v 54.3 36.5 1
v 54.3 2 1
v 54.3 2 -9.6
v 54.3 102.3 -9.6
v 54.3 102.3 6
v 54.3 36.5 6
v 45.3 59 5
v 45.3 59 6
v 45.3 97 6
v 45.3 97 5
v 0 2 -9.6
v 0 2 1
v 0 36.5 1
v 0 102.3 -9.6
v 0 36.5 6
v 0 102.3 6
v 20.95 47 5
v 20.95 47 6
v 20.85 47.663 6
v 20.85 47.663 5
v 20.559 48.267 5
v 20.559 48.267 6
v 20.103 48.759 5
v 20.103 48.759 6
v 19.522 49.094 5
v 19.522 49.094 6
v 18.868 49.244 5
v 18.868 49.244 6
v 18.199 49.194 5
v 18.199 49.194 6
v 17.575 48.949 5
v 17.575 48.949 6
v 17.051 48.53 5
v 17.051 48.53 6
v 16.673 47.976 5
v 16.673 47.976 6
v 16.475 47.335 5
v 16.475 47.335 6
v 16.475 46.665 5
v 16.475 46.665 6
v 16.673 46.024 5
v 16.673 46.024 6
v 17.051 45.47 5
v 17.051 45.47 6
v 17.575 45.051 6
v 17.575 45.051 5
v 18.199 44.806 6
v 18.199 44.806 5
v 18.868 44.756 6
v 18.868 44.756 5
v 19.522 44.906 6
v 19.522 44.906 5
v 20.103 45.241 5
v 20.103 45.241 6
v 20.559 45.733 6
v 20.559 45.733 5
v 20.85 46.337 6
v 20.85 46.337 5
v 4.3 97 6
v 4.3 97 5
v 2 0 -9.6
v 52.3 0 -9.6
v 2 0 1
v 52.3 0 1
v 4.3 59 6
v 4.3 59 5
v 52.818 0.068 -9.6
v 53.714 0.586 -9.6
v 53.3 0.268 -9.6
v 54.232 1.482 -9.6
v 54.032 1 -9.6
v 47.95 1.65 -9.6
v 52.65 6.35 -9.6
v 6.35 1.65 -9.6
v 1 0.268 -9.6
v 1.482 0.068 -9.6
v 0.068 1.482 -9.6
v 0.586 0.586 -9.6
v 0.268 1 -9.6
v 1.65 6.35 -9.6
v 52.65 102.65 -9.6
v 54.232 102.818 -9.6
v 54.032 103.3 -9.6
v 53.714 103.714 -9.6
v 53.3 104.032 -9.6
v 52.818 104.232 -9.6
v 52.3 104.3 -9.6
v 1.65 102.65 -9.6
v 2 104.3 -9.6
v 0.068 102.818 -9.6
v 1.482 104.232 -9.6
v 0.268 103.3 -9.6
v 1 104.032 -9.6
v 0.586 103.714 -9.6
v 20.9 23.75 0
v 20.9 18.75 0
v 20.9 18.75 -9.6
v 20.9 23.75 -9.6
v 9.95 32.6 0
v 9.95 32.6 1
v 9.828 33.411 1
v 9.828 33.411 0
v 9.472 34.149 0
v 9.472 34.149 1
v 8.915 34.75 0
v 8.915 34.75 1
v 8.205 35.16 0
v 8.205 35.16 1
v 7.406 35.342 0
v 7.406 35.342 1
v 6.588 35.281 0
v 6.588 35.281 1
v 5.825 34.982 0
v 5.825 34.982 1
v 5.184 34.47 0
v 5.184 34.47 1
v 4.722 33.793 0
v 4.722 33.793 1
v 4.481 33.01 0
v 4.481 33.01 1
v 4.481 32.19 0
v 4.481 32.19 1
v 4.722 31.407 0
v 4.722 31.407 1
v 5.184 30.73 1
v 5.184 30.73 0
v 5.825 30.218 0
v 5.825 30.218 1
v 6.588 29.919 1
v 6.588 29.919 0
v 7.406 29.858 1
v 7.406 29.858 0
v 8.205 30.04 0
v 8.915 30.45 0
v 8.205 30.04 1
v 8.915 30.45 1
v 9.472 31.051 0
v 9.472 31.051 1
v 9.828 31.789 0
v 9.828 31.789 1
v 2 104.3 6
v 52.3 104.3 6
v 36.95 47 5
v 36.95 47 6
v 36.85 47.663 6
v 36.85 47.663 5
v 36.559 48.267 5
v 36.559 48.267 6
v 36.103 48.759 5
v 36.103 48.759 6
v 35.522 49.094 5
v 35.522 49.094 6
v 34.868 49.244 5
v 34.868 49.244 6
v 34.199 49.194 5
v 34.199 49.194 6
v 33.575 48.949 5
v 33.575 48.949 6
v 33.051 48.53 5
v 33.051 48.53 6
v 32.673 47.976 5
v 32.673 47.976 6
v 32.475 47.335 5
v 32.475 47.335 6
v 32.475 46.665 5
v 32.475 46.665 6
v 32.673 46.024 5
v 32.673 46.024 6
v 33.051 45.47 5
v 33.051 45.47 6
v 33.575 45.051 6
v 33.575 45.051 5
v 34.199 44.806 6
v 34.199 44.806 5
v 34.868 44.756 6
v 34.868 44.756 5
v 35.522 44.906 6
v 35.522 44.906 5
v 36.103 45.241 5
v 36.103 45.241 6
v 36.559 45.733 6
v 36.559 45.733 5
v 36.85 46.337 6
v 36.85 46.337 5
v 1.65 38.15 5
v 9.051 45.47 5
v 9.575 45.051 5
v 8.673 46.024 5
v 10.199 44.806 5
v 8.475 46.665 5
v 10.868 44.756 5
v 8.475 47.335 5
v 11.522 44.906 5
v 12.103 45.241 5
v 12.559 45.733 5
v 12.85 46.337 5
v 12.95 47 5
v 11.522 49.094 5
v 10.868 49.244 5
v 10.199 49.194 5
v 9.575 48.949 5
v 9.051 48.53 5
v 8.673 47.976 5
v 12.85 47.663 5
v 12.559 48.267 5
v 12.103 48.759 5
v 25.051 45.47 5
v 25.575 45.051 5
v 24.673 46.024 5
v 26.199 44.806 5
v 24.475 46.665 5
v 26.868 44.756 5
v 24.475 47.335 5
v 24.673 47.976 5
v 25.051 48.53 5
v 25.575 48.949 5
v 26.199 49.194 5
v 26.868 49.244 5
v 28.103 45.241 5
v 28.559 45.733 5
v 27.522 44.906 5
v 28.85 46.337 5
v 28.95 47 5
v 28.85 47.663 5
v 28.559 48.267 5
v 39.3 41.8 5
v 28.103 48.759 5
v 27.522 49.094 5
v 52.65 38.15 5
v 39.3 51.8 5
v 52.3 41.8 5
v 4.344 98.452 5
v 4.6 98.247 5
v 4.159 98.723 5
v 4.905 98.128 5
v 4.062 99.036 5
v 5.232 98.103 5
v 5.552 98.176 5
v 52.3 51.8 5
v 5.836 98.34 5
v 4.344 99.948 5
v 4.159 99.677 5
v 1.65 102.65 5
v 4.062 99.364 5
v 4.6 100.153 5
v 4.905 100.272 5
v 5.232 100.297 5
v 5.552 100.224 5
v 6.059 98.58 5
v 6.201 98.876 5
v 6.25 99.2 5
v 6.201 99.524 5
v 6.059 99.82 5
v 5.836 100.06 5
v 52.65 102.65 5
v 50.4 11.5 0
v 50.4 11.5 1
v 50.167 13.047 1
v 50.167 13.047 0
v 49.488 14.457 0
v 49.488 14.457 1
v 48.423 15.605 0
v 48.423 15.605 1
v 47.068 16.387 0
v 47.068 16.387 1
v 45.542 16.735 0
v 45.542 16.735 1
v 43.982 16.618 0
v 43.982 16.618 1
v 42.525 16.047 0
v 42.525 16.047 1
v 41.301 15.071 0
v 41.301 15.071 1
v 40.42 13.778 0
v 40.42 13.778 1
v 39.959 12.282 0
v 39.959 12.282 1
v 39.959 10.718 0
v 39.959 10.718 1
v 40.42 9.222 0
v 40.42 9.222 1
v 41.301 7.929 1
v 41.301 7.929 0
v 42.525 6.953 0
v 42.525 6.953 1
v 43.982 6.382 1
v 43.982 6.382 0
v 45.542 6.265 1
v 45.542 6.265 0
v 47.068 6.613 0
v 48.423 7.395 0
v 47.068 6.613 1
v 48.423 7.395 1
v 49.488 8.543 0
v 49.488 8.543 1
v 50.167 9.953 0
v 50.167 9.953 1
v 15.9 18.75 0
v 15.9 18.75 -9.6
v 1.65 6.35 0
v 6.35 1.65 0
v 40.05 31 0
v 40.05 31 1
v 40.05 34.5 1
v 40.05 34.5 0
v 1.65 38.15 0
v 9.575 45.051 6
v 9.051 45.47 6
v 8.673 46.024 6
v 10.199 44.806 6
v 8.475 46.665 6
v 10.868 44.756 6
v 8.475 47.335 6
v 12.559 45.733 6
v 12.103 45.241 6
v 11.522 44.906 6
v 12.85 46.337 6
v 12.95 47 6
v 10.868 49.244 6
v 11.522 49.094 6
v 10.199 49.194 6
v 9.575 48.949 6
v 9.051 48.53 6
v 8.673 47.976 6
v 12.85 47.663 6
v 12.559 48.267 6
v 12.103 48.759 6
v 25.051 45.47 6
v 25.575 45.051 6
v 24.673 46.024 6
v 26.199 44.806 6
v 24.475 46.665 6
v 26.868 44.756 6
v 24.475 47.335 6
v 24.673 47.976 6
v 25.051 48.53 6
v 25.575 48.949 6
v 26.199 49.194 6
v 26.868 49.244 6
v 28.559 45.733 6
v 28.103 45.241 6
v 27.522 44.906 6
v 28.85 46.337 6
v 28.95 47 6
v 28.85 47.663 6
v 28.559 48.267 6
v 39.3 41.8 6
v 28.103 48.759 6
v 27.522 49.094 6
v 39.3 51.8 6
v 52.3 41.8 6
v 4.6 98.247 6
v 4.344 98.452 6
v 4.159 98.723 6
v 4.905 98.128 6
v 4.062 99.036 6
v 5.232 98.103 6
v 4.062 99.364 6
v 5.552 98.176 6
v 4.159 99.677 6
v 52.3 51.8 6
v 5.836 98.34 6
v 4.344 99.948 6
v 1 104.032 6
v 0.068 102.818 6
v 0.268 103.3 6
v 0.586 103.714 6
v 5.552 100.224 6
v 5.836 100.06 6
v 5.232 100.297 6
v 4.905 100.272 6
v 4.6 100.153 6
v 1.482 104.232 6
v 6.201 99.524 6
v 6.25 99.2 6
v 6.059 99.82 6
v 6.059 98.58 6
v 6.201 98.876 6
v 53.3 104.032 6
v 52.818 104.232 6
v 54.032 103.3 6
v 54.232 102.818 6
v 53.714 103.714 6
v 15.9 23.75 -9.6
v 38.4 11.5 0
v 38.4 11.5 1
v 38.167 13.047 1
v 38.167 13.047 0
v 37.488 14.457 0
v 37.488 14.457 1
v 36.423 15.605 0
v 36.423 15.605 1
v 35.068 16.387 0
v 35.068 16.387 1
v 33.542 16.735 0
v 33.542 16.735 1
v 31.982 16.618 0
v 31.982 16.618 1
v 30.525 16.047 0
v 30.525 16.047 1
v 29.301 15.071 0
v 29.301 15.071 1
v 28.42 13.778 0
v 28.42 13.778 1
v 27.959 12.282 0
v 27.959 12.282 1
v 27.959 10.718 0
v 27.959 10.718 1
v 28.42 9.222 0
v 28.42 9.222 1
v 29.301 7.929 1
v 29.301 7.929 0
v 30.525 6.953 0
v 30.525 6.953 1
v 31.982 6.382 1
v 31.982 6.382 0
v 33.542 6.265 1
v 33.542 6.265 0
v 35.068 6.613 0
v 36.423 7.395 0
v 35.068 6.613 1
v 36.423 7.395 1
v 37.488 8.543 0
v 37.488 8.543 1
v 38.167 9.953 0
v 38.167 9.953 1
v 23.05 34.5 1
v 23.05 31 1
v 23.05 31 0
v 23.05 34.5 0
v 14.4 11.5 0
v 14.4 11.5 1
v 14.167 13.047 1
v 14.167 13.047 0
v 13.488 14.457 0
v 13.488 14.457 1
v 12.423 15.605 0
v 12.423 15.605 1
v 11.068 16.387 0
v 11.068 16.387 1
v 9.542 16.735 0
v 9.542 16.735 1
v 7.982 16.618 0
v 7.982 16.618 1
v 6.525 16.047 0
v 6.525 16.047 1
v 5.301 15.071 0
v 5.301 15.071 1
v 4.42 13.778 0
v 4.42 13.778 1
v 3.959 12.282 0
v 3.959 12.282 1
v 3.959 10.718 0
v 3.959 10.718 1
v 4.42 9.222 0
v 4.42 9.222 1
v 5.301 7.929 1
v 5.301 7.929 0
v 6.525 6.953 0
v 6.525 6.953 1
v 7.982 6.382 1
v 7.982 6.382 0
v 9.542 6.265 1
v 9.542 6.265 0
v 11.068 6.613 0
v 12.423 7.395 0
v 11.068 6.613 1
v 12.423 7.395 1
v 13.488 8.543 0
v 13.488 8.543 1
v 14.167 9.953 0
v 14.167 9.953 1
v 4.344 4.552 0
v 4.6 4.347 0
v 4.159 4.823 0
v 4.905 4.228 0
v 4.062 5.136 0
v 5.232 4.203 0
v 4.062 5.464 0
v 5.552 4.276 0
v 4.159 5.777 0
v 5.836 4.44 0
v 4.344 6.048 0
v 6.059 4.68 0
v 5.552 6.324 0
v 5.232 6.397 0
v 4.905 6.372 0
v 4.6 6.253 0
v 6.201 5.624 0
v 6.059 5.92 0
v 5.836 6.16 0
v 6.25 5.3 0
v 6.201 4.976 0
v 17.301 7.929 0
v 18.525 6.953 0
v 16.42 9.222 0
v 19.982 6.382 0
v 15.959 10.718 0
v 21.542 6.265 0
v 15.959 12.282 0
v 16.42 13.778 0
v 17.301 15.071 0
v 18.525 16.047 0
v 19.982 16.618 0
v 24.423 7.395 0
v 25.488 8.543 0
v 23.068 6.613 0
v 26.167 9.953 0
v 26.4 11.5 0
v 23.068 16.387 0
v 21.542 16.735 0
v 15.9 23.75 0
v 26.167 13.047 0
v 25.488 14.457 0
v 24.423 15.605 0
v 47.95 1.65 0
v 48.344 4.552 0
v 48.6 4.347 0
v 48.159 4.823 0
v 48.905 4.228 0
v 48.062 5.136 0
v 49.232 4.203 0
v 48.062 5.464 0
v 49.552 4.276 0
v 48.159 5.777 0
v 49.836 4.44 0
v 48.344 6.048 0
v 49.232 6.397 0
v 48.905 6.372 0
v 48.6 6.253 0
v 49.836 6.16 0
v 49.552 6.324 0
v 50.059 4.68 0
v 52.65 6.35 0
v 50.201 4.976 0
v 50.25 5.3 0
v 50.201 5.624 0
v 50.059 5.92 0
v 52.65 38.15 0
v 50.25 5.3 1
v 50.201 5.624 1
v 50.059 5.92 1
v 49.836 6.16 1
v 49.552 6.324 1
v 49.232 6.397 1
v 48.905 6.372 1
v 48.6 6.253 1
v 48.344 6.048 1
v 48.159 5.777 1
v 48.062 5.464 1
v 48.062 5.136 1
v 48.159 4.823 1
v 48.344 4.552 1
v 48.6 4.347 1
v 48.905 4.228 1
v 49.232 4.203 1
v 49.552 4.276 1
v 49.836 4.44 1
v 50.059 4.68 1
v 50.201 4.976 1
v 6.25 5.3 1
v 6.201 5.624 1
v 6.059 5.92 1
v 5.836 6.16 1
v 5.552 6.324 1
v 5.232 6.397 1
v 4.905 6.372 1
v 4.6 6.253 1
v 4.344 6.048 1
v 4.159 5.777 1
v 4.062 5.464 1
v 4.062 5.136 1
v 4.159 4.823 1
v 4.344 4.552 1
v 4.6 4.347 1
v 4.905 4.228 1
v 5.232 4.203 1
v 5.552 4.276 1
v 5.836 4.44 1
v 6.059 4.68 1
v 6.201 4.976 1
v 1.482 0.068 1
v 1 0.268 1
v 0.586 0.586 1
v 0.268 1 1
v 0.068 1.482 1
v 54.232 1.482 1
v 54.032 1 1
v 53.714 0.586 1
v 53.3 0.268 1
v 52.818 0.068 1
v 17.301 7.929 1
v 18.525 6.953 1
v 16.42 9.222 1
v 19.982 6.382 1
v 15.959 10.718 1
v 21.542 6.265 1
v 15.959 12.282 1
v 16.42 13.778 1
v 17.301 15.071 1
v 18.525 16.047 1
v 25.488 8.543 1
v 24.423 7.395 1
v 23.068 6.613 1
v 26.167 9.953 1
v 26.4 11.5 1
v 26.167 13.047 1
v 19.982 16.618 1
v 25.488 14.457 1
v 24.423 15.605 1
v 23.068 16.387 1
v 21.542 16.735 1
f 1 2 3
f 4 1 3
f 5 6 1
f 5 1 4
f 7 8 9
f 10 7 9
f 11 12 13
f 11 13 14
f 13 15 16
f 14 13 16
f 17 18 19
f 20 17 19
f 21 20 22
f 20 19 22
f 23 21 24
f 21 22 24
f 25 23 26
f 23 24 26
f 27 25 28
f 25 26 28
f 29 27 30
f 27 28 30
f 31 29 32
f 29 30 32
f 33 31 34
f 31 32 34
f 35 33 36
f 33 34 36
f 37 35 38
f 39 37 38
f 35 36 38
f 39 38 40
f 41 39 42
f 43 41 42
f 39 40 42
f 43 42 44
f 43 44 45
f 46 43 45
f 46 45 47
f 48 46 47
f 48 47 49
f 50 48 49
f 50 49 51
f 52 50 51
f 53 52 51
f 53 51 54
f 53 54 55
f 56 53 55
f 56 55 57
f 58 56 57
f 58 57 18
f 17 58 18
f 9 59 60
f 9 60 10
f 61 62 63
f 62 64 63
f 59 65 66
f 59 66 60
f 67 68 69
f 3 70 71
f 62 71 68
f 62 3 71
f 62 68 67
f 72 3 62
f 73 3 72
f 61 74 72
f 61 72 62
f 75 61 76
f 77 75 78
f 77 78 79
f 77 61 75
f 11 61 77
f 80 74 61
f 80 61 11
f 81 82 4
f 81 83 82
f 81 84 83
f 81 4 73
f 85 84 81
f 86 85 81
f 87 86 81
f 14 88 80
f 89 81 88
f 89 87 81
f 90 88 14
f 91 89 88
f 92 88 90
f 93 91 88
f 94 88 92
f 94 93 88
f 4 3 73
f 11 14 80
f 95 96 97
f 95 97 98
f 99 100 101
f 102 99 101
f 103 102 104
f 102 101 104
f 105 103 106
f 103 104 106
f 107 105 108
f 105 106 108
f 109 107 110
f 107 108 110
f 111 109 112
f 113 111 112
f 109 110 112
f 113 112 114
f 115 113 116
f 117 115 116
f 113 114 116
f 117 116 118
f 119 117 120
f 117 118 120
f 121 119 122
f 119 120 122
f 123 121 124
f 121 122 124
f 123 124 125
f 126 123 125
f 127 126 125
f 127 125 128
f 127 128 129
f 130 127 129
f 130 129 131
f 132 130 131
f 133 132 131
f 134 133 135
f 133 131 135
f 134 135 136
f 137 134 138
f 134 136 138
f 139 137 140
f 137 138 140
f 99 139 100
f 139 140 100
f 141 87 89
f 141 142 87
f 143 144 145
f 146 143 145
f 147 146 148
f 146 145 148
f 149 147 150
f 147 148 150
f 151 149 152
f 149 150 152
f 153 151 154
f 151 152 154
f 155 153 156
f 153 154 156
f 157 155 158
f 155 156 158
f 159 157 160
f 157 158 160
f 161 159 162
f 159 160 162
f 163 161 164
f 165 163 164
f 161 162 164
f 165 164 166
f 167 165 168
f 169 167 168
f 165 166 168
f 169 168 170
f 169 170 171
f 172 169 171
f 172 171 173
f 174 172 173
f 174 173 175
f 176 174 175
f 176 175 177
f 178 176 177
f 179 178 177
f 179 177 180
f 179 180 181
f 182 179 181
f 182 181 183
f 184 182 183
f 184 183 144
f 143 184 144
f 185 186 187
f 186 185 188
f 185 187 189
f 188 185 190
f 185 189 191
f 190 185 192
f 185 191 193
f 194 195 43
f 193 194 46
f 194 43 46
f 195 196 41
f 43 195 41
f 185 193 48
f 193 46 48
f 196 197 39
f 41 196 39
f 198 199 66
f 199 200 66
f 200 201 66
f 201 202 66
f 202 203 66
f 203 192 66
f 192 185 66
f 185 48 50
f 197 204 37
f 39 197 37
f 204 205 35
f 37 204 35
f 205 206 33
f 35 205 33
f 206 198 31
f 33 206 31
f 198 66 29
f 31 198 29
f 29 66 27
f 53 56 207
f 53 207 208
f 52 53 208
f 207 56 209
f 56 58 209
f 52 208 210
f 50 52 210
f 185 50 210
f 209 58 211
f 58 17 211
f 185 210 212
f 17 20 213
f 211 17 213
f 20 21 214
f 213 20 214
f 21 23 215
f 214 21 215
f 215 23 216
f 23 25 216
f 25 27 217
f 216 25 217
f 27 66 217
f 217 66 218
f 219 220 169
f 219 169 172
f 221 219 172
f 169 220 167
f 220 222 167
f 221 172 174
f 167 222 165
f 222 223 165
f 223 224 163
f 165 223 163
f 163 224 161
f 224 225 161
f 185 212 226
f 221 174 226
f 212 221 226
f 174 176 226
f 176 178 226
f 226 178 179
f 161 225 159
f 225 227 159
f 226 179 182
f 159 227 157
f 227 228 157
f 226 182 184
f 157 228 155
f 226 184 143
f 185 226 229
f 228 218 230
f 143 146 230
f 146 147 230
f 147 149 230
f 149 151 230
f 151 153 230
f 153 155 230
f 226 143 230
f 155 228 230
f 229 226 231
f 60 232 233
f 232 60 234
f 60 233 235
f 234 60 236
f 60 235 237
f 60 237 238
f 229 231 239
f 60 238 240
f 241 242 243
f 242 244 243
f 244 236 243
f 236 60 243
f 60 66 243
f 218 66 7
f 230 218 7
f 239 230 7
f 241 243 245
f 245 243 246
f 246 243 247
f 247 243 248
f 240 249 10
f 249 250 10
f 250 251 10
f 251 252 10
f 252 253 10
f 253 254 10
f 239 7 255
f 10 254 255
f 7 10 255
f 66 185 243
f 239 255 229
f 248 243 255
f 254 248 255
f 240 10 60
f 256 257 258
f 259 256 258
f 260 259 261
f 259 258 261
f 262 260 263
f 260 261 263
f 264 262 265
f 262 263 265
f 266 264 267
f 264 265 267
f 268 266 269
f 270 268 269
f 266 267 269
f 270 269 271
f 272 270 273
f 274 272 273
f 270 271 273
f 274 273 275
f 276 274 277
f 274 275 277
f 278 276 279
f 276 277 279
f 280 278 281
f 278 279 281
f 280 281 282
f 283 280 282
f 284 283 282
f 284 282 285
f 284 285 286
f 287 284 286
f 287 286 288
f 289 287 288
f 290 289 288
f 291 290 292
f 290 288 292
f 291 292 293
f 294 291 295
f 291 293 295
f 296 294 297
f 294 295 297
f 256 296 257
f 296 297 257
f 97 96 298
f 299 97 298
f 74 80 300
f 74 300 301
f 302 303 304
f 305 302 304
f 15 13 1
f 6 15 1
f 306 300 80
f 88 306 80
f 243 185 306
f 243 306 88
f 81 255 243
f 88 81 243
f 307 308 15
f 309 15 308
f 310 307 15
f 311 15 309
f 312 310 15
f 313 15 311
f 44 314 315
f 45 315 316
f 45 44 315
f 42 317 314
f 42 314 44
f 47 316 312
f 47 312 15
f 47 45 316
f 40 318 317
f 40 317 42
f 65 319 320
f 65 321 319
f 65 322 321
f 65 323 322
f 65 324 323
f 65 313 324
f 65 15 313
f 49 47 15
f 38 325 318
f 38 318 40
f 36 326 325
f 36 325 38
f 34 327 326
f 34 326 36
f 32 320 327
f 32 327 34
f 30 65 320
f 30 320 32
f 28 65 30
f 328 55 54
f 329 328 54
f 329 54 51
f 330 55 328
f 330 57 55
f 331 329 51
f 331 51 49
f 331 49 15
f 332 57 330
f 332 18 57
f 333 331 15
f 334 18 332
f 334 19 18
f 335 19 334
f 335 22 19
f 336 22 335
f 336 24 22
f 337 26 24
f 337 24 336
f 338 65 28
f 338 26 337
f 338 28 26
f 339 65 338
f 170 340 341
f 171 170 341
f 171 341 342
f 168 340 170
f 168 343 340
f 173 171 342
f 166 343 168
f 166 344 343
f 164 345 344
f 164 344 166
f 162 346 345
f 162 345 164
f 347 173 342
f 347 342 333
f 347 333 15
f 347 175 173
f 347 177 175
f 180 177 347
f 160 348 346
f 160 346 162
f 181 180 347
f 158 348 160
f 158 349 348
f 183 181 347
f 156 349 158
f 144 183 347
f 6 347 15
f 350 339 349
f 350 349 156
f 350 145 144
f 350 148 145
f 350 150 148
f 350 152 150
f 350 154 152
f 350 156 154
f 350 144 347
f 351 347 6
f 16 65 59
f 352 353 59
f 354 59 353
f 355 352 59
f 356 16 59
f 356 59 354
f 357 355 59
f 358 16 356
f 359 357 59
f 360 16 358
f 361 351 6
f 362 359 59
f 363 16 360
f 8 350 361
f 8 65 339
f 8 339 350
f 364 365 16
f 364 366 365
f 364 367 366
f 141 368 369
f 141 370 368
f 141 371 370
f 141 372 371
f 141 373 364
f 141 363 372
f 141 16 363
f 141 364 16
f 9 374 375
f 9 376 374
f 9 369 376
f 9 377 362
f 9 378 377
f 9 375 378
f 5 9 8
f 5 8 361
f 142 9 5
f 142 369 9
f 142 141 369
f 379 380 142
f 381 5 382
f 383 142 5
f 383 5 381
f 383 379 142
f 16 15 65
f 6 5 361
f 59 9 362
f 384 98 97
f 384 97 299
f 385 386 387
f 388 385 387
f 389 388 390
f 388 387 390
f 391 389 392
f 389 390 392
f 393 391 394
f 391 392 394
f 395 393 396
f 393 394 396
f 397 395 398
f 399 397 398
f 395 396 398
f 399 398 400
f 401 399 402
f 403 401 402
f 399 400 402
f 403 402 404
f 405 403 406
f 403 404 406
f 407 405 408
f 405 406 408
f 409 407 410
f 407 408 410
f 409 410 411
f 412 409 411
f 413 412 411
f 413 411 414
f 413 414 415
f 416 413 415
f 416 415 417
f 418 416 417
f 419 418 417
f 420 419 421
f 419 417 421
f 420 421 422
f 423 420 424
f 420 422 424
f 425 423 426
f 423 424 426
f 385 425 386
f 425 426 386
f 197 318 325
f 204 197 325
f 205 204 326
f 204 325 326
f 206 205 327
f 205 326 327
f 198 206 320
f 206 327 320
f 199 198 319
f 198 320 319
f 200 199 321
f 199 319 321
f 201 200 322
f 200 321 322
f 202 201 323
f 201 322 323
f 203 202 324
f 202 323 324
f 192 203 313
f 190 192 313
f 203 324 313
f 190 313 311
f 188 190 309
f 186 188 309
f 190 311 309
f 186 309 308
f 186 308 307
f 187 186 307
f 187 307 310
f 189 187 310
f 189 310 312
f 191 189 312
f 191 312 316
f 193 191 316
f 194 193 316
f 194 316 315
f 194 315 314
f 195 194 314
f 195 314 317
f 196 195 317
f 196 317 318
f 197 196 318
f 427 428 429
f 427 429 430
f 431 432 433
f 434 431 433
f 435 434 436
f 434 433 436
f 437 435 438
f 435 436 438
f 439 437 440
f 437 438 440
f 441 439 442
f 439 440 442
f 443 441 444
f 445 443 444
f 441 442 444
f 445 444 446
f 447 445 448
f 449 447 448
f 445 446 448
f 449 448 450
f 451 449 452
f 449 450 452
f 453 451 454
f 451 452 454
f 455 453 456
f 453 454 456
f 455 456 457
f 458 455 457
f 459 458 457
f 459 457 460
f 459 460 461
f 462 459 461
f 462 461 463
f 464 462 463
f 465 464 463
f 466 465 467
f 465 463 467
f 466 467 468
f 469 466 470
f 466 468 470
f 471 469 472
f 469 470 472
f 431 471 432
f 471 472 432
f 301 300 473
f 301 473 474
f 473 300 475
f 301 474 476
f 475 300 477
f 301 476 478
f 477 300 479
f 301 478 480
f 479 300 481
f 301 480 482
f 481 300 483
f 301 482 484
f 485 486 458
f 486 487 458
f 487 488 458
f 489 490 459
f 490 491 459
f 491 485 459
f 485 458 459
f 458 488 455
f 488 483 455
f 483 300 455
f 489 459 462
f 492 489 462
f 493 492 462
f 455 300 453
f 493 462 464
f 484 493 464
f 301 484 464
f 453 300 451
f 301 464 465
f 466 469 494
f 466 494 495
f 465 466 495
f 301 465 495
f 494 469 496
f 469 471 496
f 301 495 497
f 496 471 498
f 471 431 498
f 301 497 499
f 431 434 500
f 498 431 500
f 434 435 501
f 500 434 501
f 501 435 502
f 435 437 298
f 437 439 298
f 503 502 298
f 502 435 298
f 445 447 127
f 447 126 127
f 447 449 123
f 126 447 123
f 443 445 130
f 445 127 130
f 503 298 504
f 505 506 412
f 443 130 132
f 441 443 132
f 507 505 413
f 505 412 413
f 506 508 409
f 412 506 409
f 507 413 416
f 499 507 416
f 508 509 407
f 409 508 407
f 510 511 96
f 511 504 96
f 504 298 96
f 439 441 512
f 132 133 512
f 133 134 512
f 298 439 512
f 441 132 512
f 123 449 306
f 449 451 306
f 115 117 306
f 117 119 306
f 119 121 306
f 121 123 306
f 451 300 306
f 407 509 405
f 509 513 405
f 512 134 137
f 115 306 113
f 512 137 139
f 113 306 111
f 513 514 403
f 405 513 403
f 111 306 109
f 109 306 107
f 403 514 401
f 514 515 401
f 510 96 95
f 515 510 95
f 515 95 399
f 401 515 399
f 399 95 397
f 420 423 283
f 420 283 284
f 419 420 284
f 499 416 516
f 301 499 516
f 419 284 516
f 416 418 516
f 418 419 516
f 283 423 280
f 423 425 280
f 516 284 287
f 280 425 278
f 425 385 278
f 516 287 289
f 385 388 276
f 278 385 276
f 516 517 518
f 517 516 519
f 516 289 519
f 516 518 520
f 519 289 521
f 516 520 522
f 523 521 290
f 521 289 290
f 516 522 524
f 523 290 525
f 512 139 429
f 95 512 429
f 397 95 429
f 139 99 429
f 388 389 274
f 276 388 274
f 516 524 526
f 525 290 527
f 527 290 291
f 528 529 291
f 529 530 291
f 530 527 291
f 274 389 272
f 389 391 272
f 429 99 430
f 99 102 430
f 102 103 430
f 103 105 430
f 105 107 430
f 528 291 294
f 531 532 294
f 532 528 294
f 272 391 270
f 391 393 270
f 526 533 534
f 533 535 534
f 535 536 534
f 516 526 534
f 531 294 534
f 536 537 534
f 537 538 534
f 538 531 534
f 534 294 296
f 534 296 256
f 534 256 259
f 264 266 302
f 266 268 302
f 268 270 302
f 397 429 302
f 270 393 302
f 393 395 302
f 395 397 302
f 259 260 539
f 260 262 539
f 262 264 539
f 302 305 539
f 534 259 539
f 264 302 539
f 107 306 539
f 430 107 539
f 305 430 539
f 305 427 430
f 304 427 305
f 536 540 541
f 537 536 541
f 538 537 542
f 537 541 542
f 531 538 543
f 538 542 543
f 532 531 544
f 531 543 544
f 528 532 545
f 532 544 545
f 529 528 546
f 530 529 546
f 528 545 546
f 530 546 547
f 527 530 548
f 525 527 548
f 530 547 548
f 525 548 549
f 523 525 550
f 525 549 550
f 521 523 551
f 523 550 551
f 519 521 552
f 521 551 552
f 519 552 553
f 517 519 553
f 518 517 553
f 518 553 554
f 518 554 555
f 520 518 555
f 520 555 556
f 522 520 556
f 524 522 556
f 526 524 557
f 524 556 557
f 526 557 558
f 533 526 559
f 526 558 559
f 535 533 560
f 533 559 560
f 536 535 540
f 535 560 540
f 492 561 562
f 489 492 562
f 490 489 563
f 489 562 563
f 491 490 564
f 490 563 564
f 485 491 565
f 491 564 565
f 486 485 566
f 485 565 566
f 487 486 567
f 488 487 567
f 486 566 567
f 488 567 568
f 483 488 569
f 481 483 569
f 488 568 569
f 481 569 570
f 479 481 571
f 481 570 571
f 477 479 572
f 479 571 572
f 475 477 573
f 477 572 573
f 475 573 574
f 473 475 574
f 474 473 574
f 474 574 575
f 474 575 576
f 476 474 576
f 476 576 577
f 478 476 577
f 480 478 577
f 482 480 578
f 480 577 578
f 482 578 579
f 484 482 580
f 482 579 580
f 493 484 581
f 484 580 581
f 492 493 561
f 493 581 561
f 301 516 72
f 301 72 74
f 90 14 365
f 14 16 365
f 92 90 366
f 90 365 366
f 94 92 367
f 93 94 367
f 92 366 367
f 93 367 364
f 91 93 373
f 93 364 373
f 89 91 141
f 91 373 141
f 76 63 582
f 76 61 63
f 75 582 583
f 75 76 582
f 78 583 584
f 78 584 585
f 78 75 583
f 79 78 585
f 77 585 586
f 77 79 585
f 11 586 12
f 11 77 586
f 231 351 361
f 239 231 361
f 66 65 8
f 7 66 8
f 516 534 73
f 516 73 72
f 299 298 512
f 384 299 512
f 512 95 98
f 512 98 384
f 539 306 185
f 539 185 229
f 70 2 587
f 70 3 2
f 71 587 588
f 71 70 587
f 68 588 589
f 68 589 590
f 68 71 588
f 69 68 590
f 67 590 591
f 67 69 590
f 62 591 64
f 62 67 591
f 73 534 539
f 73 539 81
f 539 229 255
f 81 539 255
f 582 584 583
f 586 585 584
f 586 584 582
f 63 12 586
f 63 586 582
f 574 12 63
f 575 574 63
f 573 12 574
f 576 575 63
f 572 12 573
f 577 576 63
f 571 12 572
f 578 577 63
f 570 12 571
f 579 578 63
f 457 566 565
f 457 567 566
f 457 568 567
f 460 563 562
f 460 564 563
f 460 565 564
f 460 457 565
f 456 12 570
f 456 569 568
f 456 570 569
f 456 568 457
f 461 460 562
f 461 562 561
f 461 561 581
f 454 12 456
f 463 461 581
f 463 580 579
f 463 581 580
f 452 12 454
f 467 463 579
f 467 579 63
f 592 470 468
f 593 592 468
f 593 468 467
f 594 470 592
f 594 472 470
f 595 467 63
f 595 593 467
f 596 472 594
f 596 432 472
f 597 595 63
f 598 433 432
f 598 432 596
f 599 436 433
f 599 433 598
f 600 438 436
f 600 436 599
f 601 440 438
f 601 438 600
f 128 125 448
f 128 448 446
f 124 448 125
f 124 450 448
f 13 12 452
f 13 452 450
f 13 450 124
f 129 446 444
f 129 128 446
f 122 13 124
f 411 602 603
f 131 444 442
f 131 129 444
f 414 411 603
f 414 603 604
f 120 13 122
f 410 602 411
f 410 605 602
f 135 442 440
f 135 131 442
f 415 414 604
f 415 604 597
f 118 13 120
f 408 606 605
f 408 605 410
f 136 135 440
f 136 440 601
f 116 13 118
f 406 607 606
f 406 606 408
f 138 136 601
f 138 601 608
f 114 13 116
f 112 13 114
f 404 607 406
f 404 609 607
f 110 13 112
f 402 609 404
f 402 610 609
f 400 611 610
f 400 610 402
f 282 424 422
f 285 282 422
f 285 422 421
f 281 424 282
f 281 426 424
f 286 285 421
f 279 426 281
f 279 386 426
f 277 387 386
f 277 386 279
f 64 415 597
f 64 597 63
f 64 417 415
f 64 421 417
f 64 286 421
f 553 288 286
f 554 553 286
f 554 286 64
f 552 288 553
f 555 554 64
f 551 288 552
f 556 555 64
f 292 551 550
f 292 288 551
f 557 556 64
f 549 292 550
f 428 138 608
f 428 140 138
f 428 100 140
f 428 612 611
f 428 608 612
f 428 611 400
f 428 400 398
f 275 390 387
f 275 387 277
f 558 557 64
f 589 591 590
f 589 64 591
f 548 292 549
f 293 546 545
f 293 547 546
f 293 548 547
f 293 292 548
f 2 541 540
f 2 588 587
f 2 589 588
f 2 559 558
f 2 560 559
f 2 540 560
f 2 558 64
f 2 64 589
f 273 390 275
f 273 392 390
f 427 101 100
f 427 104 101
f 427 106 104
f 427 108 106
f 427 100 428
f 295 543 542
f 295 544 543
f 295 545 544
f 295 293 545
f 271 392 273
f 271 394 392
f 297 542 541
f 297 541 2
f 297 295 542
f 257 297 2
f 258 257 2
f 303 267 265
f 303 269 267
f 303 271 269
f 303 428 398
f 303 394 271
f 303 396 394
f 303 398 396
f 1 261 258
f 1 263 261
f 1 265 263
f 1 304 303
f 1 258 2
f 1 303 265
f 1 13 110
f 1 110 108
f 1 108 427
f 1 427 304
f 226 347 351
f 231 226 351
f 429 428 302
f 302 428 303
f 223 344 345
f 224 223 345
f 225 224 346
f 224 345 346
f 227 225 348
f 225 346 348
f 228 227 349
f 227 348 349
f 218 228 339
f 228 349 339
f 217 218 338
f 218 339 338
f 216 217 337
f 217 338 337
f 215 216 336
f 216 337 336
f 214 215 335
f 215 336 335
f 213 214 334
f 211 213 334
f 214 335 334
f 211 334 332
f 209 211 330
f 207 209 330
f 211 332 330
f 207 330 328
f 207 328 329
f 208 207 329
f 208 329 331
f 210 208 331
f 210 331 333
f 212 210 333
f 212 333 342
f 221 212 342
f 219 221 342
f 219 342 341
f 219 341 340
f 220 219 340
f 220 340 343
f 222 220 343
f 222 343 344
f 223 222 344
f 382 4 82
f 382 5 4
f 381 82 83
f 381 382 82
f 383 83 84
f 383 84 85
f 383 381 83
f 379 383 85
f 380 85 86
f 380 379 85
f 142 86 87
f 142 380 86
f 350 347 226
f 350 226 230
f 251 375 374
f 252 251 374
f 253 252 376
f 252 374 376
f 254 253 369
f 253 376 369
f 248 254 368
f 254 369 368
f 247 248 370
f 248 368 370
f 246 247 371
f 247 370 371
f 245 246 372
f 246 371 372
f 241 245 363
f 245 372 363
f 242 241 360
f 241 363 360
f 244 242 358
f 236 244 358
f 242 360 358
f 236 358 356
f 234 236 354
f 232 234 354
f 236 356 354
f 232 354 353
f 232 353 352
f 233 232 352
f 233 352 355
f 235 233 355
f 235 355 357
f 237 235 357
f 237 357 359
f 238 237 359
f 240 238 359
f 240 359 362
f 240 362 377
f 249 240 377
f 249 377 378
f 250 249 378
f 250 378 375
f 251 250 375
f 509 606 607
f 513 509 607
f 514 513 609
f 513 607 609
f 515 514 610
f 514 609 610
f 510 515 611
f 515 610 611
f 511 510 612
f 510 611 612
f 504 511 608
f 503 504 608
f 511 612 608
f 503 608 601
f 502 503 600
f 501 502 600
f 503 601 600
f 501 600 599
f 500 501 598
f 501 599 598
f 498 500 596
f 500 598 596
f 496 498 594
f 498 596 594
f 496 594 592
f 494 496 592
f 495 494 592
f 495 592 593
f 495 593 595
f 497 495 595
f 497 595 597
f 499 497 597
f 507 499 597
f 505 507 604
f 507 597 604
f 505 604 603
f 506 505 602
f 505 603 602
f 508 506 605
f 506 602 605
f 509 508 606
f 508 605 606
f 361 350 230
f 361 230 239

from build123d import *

# Parameters (mm, degrees)
SKICA1_W                 = 54.3
SKICA1_H                 = 36.5
P_IDAT_VYSUNUT_M1_DEPTH  = 1
SKICA4_W                 = 54.3
SKICA4_H                 = 67.8
SKICA4_W_2               = 51
SKICA4_H_2               = 64.5
P_IDAT_VYSUNUT_M2_DEPTH  = 6
SKICA5_W                 = 51
SKICA5_H                 = 64.5
P_IDAT_VYSUNUT_M3_DEPTH  = 1
SKICA2_R                 = 1.1
ODEBRAT_VYSUNUT_M1_DEPTH = 1
SKICA3_R                 = 5.25
SKICA3_R_2               = 2.75
SKICA3_W                 = 17
SKICA3_H                 = 3.5
ODEBRAT_VYSUNUT_M2_DEPTH = 1
SKICA6_W                 = 41
SKICA6_H                 = 38
SKICA6_R                 = 2.25
SKICA6_R_2               = 1.1
SKICA6_W_2               = 13
SKICA6_H_2               = 10
ODEBRAT_VYSUNUT_M3_DEPTH = 118.74115678
SKICA8_W                 = 54.3
SKICA8_H                 = 104.3
SKICA8_W_2               = 51
SKICA8_H_2               = 101
P_IDAT_VYSUNUT_M4_DEPTH  = 9.6
ZAOBLIT1_R               = 2
SKICA9_W                 = 5
SKICA9_H                 = 5
P_IDAT_VYSUNUT_M5_DEPTH  = 9.6


with BuildPart() as part:
    # Skica1 → Přidat vysunutím1 (new body)
    with BuildSketch(Plane.XY):
        with Locations((27.15, 18.25)):
            Rectangle(SKICA1_W, SKICA1_H)
    extrude(amount=P_IDAT_VYSUNUT_M1_DEPTH)

    # Skica4 → Přidat vysunutím2 (add)
    with BuildSketch(Plane.XY):
        with Locations((27.15, 70.4)):
            Rectangle(SKICA4_W, SKICA4_H)
        with Locations((27.15, 70.4)):
            Rectangle(SKICA4_W_2, SKICA4_H_2, mode=Mode.SUBTRACT)
    extrude(amount=P_IDAT_VYSUNUT_M2_DEPTH)

    # Skica5 → Přidat vysunutím3 (add)
    with BuildSketch(Plane.XY.offset(6)):
        with Locations((27.15, 70.4)):
            Rectangle(SKICA5_W, SKICA5_H)
    extrude(amount=-P_IDAT_VYSUNUT_M3_DEPTH)

    # Skica2 → Odebrat vysunutím1 (cut)
    with BuildSketch(Plane.XY.offset(1)):
        with Locations((49.15, 5.3)):
            Circle(SKICA2_R)
        with Locations((5.15, 5.3)):
            Circle(SKICA2_R)
    extrude(amount=-ODEBRAT_VYSUNUT_M1_DEPTH, mode=Mode.SUBTRACT)

    # Skica3 → Odebrat vysunutím2 (cut)
    with BuildSketch(Plane.XY.offset(1)):
        with Locations((9.15, 11.5)):
            Circle(SKICA3_R)
        with Locations((21.15, 11.5)):
            Circle(SKICA3_R)
        with Locations((33.15, 11.5)):
            Circle(SKICA3_R)
        with Locations((45.15, 11.5)):
            Circle(SKICA3_R)
        with Locations((7.2, 32.6)):
            Circle(SKICA3_R_2)
        with Locations((31.55, 32.75)):
            Rectangle(SKICA3_W, SKICA3_H)
    extrude(amount=-ODEBRAT_VYSUNUT_M2_DEPTH, mode=Mode.SUBTRACT)

    # Skica6 → Odebrat vysunutím3 (cut, through all)
    with BuildSketch(Plane.XY.offset(6)):
        with Locations((24.8, 78)):
            Rectangle(SKICA6_W, SKICA6_H)
        with Locations((34.7, 47)):
            Circle(SKICA6_R)
        with Locations((26.7, 47)):
            Circle(SKICA6_R)
        with Locations((18.7, 47)):
            Circle(SKICA6_R)
        with Locations((10.7, 47)):
            Circle(SKICA6_R)
        with Locations((5.15, 99.2)):
            Circle(SKICA6_R_2)
        with Locations((45.8, 46.8)):
            Rectangle(SKICA6_W_2, SKICA6_H_2)
    extrude(amount=-ODEBRAT_VYSUNUT_M3_DEPTH, mode=Mode.SUBTRACT)

    # Skica8 → Přidat vysunutím4 (add)
    with BuildSketch(Plane(origin=(0, 0, 0), x_dir=(-1, 0, 0), z_dir=(0, 0, -1))):
        with Locations((-27.15, 52.15)):
            Rectangle(SKICA8_W, SKICA8_H)
        with Locations((-27.15, 52.15)):
            Rectangle(SKICA8_W_2, SKICA8_H_2, mode=Mode.SUBTRACT)
    extrude(amount=P_IDAT_VYSUNUT_M4_DEPTH)

    # Zaoblit1
    zaoblit1_edges = [part.edges().sort_by_distance(p)[0] for p in [
        (0, 104.3, -1.8),
        (54.3, 104.3, -1.8),
        (54.3, 0, -4.3),
        (0, 0, -4.3),
    ]]
    fillet(zaoblit1_edges, radius=ZAOBLIT1_R)

    # Skica9 → Přidat vysunutím5 (add)
    with BuildSketch(Plane(origin=(0, 0, 0), x_dir=(-1, 0, 0), z_dir=(0, 0, -1))):
        Polygon((-1.65, 1.65), (-1.65, 6.35), (-6.35, 1.65), align=None)
        Polygon((-52.65, 1.65), (-52.65, 6.35), (-47.95, 1.65), align=None)
        with Locations((-18.4, 21.25)):
            Rectangle(SKICA9_W, SKICA9_H)
    extrude(amount=P_IDAT_VYSUNUT_M5_DEPTH)


solid = part.part
